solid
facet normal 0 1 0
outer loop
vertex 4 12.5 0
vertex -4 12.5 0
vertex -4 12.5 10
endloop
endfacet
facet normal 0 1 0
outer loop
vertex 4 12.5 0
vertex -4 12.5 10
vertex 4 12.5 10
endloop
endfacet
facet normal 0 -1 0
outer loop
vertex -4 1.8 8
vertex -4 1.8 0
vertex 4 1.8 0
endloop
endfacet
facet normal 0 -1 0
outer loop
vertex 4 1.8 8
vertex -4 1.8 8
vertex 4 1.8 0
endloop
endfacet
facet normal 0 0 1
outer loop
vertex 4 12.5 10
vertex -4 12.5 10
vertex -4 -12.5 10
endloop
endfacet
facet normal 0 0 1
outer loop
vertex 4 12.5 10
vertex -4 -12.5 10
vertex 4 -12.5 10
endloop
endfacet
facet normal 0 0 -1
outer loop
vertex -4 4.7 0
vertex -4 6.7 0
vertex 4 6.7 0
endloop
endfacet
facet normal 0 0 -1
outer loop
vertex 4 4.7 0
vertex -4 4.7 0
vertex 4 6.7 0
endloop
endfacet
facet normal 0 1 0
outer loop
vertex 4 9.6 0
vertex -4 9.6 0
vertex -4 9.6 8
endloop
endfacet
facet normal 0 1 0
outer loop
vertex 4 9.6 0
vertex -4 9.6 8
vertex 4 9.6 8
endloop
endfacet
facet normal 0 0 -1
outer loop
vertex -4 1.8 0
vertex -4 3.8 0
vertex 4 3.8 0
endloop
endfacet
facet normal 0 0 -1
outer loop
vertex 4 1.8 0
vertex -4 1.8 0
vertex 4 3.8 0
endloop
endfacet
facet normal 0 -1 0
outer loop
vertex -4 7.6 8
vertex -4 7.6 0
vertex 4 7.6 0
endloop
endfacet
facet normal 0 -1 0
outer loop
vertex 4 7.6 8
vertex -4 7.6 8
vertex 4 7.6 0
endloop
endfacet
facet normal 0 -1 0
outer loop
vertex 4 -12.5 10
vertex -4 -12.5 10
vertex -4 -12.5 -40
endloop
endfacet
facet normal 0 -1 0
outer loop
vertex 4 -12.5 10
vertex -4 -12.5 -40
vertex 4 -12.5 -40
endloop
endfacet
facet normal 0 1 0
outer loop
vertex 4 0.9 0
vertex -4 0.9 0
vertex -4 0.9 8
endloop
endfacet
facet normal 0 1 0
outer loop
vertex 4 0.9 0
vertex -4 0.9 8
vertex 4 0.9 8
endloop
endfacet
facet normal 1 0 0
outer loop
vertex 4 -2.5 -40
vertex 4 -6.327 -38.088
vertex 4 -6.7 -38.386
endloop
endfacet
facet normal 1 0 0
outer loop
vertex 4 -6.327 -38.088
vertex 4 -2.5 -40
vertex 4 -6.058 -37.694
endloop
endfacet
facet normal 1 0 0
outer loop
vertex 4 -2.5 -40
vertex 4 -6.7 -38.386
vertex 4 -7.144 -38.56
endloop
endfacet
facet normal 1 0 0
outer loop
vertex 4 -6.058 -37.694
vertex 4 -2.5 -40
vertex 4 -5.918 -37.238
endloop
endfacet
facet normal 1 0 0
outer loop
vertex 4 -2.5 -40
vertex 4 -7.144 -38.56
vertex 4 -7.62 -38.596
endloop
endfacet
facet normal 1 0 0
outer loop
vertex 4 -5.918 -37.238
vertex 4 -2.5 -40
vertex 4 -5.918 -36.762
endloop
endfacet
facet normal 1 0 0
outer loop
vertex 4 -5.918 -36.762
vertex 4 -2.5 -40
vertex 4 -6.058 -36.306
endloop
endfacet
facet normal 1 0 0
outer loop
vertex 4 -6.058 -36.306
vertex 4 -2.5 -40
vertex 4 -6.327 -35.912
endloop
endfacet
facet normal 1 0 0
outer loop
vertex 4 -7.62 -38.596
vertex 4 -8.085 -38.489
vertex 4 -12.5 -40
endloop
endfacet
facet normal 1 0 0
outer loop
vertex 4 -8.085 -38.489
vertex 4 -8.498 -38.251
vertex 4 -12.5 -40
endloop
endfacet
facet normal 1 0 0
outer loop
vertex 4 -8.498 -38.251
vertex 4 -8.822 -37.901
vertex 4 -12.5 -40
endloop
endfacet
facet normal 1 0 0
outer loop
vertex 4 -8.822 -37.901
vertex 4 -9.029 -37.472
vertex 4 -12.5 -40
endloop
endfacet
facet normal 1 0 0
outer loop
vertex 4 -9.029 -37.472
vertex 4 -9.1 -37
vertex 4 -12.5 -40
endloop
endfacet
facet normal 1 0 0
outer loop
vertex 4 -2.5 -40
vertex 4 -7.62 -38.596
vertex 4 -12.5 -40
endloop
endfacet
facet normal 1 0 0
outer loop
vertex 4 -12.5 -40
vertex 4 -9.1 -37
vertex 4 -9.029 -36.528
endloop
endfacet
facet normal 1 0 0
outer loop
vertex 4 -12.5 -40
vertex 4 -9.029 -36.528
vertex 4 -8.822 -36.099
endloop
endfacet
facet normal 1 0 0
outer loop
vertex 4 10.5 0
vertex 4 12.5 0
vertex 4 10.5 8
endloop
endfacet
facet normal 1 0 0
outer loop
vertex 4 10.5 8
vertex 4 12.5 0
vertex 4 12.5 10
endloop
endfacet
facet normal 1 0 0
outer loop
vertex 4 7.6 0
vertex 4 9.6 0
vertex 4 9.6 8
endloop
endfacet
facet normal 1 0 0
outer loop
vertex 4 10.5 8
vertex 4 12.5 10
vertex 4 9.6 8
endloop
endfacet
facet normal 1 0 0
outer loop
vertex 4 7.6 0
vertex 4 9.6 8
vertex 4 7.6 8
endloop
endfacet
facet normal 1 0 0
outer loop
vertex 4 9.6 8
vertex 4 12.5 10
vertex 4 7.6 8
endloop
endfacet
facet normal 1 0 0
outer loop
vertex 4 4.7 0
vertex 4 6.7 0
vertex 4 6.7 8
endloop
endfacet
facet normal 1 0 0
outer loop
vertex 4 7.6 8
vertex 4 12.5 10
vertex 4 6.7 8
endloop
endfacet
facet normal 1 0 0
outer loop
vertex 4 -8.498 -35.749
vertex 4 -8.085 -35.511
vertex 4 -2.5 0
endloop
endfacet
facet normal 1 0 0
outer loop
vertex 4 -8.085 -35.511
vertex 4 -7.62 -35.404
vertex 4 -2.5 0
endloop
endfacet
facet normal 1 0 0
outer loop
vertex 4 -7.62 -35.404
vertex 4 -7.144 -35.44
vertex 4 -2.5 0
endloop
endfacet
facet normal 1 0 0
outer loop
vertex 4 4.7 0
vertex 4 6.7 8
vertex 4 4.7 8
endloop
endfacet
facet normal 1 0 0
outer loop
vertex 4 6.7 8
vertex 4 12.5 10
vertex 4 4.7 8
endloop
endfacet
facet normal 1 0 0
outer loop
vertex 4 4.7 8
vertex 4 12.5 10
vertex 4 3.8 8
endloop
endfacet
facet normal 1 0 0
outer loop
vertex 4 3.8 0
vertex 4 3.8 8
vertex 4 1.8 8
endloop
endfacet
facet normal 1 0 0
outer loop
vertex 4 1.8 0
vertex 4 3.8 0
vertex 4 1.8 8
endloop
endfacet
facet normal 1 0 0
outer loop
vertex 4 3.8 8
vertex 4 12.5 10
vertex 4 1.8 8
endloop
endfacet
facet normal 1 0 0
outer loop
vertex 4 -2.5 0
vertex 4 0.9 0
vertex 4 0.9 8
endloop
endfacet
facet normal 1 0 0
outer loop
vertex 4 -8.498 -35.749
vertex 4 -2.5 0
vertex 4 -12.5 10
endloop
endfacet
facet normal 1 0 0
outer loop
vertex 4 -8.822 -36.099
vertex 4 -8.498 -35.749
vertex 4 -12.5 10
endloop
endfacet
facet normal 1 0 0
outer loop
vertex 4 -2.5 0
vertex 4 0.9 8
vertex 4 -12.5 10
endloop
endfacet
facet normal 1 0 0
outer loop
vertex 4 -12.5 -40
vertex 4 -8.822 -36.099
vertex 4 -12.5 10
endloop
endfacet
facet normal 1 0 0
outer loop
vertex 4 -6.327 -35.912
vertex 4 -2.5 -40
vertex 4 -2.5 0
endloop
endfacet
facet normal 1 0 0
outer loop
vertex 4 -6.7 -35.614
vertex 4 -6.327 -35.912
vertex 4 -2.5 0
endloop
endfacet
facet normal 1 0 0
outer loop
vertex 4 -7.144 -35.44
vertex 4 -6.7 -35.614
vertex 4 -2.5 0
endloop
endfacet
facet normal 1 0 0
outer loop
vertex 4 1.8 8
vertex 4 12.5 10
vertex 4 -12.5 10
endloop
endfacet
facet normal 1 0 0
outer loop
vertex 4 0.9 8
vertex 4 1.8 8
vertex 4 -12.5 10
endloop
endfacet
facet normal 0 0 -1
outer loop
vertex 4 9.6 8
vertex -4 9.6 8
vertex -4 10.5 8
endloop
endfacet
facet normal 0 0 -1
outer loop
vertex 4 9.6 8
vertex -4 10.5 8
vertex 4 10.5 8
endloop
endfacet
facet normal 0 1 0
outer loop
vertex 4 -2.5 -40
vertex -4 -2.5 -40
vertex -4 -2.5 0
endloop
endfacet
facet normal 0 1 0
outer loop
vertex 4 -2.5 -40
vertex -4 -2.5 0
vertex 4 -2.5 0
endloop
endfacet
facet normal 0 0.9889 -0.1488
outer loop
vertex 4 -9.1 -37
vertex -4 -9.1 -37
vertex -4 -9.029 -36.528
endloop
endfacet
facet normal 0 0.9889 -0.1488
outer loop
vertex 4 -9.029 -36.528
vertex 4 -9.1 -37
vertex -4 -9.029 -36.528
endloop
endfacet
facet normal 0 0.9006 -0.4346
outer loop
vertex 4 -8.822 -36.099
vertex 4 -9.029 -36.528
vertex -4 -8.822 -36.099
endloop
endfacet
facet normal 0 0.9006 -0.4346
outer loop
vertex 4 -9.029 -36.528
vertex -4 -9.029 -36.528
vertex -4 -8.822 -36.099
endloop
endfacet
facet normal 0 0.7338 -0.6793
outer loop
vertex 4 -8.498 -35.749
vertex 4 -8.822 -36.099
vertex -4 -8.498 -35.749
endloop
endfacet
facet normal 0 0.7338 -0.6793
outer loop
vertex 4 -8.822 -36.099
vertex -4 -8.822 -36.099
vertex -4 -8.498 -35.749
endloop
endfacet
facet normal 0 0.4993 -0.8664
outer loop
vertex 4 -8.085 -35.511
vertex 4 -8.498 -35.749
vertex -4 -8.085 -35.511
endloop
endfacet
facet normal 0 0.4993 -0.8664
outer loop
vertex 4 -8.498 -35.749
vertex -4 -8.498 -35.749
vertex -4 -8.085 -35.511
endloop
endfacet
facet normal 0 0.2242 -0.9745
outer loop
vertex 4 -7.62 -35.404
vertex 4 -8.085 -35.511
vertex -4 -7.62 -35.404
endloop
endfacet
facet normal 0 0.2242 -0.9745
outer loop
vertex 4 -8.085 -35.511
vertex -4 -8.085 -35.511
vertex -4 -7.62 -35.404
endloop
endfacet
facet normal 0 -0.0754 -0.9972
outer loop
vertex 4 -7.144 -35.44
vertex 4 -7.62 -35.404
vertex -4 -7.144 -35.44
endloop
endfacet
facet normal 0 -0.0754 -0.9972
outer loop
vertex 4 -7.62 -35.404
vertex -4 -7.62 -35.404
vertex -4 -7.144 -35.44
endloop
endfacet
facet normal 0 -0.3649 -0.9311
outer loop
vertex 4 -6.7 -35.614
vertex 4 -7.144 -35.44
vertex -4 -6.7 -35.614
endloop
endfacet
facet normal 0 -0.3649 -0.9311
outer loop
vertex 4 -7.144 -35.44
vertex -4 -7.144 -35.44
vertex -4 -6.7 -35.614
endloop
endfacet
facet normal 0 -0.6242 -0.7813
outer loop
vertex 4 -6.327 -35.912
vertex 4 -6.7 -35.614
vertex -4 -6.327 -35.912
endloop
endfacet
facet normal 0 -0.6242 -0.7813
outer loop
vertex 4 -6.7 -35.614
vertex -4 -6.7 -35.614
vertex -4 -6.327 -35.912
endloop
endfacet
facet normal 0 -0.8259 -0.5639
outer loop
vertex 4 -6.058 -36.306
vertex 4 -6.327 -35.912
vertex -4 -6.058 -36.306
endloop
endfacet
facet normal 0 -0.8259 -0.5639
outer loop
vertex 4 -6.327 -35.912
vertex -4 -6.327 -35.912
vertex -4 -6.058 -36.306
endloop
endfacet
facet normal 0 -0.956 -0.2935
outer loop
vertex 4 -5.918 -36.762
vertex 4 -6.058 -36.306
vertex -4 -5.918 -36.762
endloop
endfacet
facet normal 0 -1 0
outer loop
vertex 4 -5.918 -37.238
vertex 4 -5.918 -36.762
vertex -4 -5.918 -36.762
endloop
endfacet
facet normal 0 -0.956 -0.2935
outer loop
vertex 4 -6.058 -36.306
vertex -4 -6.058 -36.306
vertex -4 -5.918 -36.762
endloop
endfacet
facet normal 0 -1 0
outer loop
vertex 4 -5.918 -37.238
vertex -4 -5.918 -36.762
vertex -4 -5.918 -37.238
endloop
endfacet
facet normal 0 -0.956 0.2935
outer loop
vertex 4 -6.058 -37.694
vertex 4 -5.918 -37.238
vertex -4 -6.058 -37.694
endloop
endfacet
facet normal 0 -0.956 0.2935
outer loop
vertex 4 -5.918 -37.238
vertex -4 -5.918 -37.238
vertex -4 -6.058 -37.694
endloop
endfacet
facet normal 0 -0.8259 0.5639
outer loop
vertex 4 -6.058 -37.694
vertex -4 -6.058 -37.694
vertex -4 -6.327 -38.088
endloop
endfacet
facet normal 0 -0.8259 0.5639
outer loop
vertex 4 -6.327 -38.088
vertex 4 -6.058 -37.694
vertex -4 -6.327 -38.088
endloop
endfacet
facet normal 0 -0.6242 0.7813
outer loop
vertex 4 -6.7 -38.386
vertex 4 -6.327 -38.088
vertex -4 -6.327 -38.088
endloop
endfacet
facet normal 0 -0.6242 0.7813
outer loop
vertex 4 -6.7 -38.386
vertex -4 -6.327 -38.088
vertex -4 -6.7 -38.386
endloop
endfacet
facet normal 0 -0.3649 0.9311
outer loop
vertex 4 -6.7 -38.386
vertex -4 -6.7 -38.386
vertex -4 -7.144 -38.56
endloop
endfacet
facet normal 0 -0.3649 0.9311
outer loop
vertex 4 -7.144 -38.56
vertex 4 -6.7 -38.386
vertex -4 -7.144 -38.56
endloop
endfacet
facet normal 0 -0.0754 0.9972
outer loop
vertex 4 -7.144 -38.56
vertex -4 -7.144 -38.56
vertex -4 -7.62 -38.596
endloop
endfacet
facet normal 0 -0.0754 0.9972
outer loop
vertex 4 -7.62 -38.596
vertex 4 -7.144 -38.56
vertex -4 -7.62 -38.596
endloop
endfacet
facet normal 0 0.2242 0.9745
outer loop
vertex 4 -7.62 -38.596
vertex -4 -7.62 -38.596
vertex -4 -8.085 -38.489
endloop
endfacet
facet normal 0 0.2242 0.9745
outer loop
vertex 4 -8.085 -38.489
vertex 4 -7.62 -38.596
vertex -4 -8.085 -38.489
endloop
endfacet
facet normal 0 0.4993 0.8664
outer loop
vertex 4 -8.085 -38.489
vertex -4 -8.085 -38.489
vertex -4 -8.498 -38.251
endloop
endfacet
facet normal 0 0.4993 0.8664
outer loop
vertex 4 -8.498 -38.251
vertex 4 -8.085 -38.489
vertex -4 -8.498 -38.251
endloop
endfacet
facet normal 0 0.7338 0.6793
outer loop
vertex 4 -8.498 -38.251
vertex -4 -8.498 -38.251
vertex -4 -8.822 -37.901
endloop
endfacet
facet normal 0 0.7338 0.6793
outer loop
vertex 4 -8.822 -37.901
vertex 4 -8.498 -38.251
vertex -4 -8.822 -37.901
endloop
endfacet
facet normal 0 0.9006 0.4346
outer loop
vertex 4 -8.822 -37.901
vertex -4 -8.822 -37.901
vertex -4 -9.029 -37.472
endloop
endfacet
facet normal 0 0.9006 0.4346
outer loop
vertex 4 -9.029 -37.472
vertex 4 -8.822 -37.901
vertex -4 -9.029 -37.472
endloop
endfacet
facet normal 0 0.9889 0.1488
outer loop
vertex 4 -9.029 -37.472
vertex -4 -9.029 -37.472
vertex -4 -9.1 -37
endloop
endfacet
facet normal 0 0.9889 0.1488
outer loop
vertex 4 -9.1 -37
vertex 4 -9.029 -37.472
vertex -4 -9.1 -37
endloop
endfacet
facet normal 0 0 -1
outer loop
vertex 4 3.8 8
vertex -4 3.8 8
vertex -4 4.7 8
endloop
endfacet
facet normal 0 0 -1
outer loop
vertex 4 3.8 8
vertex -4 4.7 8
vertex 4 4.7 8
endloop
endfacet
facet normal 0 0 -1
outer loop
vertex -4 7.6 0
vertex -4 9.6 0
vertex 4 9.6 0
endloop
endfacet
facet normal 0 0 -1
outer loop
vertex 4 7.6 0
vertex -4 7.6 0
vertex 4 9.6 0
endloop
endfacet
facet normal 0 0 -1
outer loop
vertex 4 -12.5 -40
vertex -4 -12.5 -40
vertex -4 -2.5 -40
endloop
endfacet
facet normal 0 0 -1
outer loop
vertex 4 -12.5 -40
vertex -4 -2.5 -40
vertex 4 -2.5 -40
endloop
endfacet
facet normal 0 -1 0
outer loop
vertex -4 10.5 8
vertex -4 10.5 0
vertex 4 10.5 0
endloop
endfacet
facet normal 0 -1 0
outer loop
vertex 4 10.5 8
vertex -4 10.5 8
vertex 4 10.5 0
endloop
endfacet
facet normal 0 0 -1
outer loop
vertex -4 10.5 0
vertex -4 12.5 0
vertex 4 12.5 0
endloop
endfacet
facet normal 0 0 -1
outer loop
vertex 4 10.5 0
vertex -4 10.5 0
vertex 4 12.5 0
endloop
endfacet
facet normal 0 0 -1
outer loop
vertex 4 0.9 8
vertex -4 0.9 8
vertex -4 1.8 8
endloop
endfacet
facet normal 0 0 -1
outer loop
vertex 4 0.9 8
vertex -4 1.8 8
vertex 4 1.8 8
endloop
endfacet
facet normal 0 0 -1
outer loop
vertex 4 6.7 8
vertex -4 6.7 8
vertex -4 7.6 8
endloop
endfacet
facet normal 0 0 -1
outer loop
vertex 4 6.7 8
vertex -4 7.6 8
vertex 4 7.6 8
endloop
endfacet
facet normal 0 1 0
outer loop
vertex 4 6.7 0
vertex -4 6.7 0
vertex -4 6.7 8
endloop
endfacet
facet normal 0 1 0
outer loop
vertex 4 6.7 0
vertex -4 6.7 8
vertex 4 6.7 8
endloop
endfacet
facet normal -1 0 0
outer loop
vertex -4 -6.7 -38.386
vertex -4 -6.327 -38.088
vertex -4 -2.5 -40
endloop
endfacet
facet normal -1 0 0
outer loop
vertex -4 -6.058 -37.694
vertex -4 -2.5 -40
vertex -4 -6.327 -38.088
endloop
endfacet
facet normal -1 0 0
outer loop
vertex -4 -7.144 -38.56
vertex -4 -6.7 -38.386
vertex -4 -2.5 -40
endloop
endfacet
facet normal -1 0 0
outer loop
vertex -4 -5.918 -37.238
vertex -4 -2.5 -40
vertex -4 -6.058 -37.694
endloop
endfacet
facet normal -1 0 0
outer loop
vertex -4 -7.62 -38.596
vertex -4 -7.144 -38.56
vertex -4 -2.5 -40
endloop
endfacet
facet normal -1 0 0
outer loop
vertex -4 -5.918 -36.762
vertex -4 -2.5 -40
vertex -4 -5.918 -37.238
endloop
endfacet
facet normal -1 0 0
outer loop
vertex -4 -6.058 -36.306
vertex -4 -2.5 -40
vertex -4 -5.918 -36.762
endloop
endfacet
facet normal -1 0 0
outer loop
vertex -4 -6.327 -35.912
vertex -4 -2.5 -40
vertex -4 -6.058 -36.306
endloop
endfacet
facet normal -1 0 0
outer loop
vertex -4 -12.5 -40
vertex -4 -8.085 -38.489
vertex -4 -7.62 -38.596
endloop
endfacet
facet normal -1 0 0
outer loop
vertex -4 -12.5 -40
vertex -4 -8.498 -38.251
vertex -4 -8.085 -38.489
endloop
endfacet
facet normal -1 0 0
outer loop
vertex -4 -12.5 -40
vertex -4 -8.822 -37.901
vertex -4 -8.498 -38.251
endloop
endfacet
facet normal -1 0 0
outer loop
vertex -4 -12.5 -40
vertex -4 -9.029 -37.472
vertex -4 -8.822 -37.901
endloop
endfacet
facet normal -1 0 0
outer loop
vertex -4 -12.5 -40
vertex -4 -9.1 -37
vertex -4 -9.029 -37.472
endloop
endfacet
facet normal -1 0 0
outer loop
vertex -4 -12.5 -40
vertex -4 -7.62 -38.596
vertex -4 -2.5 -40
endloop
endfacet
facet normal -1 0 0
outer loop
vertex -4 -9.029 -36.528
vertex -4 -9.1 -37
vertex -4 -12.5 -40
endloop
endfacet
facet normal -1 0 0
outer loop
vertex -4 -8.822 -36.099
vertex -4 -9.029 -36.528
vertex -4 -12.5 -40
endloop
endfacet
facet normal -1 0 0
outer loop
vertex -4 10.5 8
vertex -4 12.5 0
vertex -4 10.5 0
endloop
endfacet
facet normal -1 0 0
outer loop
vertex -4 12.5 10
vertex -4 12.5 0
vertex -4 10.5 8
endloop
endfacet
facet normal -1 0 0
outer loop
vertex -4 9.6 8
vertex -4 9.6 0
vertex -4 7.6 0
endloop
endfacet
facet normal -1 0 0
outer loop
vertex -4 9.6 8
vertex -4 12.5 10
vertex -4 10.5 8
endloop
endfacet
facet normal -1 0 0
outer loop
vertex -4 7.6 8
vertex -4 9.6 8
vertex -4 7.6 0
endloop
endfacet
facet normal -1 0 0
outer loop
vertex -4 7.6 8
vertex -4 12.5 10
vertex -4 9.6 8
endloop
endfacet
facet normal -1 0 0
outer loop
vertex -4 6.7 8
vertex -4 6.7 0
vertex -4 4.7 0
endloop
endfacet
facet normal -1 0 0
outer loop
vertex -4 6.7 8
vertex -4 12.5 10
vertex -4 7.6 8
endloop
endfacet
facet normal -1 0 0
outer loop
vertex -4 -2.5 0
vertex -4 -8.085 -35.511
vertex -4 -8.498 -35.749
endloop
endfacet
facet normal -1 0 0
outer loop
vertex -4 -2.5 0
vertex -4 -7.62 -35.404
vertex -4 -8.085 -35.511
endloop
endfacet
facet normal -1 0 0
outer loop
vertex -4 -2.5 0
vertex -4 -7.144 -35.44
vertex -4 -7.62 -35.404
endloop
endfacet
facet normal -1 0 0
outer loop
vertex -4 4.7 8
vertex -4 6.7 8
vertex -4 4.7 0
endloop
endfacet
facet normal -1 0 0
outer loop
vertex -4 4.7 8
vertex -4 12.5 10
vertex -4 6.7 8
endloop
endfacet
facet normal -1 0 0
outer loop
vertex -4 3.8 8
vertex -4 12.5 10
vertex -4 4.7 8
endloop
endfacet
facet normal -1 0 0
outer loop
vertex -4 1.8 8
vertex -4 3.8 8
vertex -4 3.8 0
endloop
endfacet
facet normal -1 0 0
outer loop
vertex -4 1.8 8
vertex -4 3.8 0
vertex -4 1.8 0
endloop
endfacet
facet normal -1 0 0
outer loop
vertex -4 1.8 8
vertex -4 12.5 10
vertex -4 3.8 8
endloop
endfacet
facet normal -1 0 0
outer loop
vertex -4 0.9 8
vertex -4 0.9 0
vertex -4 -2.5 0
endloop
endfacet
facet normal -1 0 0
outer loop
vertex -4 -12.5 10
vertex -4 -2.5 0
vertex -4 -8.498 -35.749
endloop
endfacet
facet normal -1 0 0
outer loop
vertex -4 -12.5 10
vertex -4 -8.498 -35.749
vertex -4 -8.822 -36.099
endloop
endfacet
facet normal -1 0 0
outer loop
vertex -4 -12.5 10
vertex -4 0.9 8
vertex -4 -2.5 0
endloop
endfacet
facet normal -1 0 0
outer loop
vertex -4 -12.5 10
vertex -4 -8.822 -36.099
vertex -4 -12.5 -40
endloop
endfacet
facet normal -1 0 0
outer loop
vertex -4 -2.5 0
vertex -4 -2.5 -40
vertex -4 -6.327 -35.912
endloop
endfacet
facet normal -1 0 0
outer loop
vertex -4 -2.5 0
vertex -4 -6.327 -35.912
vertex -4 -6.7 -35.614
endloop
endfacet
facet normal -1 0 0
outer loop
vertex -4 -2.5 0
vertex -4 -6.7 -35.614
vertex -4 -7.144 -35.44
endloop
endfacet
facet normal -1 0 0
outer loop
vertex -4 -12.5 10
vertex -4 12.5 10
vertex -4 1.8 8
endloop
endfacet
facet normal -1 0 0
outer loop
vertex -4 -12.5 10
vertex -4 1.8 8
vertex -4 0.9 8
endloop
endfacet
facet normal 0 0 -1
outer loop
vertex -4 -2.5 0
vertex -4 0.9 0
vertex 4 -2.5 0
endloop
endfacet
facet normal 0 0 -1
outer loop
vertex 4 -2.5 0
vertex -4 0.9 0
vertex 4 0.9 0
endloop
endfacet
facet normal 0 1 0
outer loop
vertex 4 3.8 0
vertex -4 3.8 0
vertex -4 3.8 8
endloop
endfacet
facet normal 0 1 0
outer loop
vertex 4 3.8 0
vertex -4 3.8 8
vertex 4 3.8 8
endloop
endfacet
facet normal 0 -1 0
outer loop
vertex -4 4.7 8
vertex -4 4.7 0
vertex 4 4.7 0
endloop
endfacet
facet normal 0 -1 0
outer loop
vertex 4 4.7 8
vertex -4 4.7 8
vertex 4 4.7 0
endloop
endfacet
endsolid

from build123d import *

# Parameters (mm, degrees)
F0_W     = 8
F0_H     = 25
F1_DEPTH = 10
F2_W     = 8
F2_H     = 0.9
F3_DEPTH = 8
F4_W     = 8
F4_H     = 10
F5_DEPTH = 40
F6_R     = 1.6
F7_DEPTH = 8.001


with BuildPart() as f1:
    # F0 (on Top) → F1 (new body)
    with BuildSketch(Plane.XY):
        Rectangle(F0_W, F0_H)
    extrude(amount=F1_DEPTH)

    # F2 (on face) → F3 (cut)
    with BuildSketch(Plane(origin=(0, 0, 0), x_dir=(1, 0, 0), z_dir=(0, 0, -1))):
        with Locations((0, -10.05)):
            Rectangle(F2_W, F2_H)
        with Locations((0, -7.15)):
            Rectangle(F2_W, F2_H)
        with Locations((0, -4.25)):
            Rectangle(F2_W, F2_H)
        with Locations((0, -1.35)):
            Rectangle(F2_W, F2_H)
    extrude(amount=-F3_DEPTH, mode=Mode.SUBTRACT)

    # F4 (on face) → F5 (join)
    with BuildSketch(Plane(origin=(0, 0, 0), x_dir=(1, 0, 0), z_dir=(0, 0, -1))):
        with Locations((0, 7.5)):
            Rectangle(F4_W, F4_H)
    extrude(amount=F5_DEPTH)

    # F6 (on face) → F7 (cut, through all)
    with BuildSketch(Plane(origin=(-4, 0, 0), x_dir=(0, -1, 0), z_dir=(-1, 0, 0))):
        with Locations((7.5, -37)):
            Circle(F6_R)
    extrude(amount=-F7_DEPTH, mode=Mode.SUBTRACT)


solid = f1.part
